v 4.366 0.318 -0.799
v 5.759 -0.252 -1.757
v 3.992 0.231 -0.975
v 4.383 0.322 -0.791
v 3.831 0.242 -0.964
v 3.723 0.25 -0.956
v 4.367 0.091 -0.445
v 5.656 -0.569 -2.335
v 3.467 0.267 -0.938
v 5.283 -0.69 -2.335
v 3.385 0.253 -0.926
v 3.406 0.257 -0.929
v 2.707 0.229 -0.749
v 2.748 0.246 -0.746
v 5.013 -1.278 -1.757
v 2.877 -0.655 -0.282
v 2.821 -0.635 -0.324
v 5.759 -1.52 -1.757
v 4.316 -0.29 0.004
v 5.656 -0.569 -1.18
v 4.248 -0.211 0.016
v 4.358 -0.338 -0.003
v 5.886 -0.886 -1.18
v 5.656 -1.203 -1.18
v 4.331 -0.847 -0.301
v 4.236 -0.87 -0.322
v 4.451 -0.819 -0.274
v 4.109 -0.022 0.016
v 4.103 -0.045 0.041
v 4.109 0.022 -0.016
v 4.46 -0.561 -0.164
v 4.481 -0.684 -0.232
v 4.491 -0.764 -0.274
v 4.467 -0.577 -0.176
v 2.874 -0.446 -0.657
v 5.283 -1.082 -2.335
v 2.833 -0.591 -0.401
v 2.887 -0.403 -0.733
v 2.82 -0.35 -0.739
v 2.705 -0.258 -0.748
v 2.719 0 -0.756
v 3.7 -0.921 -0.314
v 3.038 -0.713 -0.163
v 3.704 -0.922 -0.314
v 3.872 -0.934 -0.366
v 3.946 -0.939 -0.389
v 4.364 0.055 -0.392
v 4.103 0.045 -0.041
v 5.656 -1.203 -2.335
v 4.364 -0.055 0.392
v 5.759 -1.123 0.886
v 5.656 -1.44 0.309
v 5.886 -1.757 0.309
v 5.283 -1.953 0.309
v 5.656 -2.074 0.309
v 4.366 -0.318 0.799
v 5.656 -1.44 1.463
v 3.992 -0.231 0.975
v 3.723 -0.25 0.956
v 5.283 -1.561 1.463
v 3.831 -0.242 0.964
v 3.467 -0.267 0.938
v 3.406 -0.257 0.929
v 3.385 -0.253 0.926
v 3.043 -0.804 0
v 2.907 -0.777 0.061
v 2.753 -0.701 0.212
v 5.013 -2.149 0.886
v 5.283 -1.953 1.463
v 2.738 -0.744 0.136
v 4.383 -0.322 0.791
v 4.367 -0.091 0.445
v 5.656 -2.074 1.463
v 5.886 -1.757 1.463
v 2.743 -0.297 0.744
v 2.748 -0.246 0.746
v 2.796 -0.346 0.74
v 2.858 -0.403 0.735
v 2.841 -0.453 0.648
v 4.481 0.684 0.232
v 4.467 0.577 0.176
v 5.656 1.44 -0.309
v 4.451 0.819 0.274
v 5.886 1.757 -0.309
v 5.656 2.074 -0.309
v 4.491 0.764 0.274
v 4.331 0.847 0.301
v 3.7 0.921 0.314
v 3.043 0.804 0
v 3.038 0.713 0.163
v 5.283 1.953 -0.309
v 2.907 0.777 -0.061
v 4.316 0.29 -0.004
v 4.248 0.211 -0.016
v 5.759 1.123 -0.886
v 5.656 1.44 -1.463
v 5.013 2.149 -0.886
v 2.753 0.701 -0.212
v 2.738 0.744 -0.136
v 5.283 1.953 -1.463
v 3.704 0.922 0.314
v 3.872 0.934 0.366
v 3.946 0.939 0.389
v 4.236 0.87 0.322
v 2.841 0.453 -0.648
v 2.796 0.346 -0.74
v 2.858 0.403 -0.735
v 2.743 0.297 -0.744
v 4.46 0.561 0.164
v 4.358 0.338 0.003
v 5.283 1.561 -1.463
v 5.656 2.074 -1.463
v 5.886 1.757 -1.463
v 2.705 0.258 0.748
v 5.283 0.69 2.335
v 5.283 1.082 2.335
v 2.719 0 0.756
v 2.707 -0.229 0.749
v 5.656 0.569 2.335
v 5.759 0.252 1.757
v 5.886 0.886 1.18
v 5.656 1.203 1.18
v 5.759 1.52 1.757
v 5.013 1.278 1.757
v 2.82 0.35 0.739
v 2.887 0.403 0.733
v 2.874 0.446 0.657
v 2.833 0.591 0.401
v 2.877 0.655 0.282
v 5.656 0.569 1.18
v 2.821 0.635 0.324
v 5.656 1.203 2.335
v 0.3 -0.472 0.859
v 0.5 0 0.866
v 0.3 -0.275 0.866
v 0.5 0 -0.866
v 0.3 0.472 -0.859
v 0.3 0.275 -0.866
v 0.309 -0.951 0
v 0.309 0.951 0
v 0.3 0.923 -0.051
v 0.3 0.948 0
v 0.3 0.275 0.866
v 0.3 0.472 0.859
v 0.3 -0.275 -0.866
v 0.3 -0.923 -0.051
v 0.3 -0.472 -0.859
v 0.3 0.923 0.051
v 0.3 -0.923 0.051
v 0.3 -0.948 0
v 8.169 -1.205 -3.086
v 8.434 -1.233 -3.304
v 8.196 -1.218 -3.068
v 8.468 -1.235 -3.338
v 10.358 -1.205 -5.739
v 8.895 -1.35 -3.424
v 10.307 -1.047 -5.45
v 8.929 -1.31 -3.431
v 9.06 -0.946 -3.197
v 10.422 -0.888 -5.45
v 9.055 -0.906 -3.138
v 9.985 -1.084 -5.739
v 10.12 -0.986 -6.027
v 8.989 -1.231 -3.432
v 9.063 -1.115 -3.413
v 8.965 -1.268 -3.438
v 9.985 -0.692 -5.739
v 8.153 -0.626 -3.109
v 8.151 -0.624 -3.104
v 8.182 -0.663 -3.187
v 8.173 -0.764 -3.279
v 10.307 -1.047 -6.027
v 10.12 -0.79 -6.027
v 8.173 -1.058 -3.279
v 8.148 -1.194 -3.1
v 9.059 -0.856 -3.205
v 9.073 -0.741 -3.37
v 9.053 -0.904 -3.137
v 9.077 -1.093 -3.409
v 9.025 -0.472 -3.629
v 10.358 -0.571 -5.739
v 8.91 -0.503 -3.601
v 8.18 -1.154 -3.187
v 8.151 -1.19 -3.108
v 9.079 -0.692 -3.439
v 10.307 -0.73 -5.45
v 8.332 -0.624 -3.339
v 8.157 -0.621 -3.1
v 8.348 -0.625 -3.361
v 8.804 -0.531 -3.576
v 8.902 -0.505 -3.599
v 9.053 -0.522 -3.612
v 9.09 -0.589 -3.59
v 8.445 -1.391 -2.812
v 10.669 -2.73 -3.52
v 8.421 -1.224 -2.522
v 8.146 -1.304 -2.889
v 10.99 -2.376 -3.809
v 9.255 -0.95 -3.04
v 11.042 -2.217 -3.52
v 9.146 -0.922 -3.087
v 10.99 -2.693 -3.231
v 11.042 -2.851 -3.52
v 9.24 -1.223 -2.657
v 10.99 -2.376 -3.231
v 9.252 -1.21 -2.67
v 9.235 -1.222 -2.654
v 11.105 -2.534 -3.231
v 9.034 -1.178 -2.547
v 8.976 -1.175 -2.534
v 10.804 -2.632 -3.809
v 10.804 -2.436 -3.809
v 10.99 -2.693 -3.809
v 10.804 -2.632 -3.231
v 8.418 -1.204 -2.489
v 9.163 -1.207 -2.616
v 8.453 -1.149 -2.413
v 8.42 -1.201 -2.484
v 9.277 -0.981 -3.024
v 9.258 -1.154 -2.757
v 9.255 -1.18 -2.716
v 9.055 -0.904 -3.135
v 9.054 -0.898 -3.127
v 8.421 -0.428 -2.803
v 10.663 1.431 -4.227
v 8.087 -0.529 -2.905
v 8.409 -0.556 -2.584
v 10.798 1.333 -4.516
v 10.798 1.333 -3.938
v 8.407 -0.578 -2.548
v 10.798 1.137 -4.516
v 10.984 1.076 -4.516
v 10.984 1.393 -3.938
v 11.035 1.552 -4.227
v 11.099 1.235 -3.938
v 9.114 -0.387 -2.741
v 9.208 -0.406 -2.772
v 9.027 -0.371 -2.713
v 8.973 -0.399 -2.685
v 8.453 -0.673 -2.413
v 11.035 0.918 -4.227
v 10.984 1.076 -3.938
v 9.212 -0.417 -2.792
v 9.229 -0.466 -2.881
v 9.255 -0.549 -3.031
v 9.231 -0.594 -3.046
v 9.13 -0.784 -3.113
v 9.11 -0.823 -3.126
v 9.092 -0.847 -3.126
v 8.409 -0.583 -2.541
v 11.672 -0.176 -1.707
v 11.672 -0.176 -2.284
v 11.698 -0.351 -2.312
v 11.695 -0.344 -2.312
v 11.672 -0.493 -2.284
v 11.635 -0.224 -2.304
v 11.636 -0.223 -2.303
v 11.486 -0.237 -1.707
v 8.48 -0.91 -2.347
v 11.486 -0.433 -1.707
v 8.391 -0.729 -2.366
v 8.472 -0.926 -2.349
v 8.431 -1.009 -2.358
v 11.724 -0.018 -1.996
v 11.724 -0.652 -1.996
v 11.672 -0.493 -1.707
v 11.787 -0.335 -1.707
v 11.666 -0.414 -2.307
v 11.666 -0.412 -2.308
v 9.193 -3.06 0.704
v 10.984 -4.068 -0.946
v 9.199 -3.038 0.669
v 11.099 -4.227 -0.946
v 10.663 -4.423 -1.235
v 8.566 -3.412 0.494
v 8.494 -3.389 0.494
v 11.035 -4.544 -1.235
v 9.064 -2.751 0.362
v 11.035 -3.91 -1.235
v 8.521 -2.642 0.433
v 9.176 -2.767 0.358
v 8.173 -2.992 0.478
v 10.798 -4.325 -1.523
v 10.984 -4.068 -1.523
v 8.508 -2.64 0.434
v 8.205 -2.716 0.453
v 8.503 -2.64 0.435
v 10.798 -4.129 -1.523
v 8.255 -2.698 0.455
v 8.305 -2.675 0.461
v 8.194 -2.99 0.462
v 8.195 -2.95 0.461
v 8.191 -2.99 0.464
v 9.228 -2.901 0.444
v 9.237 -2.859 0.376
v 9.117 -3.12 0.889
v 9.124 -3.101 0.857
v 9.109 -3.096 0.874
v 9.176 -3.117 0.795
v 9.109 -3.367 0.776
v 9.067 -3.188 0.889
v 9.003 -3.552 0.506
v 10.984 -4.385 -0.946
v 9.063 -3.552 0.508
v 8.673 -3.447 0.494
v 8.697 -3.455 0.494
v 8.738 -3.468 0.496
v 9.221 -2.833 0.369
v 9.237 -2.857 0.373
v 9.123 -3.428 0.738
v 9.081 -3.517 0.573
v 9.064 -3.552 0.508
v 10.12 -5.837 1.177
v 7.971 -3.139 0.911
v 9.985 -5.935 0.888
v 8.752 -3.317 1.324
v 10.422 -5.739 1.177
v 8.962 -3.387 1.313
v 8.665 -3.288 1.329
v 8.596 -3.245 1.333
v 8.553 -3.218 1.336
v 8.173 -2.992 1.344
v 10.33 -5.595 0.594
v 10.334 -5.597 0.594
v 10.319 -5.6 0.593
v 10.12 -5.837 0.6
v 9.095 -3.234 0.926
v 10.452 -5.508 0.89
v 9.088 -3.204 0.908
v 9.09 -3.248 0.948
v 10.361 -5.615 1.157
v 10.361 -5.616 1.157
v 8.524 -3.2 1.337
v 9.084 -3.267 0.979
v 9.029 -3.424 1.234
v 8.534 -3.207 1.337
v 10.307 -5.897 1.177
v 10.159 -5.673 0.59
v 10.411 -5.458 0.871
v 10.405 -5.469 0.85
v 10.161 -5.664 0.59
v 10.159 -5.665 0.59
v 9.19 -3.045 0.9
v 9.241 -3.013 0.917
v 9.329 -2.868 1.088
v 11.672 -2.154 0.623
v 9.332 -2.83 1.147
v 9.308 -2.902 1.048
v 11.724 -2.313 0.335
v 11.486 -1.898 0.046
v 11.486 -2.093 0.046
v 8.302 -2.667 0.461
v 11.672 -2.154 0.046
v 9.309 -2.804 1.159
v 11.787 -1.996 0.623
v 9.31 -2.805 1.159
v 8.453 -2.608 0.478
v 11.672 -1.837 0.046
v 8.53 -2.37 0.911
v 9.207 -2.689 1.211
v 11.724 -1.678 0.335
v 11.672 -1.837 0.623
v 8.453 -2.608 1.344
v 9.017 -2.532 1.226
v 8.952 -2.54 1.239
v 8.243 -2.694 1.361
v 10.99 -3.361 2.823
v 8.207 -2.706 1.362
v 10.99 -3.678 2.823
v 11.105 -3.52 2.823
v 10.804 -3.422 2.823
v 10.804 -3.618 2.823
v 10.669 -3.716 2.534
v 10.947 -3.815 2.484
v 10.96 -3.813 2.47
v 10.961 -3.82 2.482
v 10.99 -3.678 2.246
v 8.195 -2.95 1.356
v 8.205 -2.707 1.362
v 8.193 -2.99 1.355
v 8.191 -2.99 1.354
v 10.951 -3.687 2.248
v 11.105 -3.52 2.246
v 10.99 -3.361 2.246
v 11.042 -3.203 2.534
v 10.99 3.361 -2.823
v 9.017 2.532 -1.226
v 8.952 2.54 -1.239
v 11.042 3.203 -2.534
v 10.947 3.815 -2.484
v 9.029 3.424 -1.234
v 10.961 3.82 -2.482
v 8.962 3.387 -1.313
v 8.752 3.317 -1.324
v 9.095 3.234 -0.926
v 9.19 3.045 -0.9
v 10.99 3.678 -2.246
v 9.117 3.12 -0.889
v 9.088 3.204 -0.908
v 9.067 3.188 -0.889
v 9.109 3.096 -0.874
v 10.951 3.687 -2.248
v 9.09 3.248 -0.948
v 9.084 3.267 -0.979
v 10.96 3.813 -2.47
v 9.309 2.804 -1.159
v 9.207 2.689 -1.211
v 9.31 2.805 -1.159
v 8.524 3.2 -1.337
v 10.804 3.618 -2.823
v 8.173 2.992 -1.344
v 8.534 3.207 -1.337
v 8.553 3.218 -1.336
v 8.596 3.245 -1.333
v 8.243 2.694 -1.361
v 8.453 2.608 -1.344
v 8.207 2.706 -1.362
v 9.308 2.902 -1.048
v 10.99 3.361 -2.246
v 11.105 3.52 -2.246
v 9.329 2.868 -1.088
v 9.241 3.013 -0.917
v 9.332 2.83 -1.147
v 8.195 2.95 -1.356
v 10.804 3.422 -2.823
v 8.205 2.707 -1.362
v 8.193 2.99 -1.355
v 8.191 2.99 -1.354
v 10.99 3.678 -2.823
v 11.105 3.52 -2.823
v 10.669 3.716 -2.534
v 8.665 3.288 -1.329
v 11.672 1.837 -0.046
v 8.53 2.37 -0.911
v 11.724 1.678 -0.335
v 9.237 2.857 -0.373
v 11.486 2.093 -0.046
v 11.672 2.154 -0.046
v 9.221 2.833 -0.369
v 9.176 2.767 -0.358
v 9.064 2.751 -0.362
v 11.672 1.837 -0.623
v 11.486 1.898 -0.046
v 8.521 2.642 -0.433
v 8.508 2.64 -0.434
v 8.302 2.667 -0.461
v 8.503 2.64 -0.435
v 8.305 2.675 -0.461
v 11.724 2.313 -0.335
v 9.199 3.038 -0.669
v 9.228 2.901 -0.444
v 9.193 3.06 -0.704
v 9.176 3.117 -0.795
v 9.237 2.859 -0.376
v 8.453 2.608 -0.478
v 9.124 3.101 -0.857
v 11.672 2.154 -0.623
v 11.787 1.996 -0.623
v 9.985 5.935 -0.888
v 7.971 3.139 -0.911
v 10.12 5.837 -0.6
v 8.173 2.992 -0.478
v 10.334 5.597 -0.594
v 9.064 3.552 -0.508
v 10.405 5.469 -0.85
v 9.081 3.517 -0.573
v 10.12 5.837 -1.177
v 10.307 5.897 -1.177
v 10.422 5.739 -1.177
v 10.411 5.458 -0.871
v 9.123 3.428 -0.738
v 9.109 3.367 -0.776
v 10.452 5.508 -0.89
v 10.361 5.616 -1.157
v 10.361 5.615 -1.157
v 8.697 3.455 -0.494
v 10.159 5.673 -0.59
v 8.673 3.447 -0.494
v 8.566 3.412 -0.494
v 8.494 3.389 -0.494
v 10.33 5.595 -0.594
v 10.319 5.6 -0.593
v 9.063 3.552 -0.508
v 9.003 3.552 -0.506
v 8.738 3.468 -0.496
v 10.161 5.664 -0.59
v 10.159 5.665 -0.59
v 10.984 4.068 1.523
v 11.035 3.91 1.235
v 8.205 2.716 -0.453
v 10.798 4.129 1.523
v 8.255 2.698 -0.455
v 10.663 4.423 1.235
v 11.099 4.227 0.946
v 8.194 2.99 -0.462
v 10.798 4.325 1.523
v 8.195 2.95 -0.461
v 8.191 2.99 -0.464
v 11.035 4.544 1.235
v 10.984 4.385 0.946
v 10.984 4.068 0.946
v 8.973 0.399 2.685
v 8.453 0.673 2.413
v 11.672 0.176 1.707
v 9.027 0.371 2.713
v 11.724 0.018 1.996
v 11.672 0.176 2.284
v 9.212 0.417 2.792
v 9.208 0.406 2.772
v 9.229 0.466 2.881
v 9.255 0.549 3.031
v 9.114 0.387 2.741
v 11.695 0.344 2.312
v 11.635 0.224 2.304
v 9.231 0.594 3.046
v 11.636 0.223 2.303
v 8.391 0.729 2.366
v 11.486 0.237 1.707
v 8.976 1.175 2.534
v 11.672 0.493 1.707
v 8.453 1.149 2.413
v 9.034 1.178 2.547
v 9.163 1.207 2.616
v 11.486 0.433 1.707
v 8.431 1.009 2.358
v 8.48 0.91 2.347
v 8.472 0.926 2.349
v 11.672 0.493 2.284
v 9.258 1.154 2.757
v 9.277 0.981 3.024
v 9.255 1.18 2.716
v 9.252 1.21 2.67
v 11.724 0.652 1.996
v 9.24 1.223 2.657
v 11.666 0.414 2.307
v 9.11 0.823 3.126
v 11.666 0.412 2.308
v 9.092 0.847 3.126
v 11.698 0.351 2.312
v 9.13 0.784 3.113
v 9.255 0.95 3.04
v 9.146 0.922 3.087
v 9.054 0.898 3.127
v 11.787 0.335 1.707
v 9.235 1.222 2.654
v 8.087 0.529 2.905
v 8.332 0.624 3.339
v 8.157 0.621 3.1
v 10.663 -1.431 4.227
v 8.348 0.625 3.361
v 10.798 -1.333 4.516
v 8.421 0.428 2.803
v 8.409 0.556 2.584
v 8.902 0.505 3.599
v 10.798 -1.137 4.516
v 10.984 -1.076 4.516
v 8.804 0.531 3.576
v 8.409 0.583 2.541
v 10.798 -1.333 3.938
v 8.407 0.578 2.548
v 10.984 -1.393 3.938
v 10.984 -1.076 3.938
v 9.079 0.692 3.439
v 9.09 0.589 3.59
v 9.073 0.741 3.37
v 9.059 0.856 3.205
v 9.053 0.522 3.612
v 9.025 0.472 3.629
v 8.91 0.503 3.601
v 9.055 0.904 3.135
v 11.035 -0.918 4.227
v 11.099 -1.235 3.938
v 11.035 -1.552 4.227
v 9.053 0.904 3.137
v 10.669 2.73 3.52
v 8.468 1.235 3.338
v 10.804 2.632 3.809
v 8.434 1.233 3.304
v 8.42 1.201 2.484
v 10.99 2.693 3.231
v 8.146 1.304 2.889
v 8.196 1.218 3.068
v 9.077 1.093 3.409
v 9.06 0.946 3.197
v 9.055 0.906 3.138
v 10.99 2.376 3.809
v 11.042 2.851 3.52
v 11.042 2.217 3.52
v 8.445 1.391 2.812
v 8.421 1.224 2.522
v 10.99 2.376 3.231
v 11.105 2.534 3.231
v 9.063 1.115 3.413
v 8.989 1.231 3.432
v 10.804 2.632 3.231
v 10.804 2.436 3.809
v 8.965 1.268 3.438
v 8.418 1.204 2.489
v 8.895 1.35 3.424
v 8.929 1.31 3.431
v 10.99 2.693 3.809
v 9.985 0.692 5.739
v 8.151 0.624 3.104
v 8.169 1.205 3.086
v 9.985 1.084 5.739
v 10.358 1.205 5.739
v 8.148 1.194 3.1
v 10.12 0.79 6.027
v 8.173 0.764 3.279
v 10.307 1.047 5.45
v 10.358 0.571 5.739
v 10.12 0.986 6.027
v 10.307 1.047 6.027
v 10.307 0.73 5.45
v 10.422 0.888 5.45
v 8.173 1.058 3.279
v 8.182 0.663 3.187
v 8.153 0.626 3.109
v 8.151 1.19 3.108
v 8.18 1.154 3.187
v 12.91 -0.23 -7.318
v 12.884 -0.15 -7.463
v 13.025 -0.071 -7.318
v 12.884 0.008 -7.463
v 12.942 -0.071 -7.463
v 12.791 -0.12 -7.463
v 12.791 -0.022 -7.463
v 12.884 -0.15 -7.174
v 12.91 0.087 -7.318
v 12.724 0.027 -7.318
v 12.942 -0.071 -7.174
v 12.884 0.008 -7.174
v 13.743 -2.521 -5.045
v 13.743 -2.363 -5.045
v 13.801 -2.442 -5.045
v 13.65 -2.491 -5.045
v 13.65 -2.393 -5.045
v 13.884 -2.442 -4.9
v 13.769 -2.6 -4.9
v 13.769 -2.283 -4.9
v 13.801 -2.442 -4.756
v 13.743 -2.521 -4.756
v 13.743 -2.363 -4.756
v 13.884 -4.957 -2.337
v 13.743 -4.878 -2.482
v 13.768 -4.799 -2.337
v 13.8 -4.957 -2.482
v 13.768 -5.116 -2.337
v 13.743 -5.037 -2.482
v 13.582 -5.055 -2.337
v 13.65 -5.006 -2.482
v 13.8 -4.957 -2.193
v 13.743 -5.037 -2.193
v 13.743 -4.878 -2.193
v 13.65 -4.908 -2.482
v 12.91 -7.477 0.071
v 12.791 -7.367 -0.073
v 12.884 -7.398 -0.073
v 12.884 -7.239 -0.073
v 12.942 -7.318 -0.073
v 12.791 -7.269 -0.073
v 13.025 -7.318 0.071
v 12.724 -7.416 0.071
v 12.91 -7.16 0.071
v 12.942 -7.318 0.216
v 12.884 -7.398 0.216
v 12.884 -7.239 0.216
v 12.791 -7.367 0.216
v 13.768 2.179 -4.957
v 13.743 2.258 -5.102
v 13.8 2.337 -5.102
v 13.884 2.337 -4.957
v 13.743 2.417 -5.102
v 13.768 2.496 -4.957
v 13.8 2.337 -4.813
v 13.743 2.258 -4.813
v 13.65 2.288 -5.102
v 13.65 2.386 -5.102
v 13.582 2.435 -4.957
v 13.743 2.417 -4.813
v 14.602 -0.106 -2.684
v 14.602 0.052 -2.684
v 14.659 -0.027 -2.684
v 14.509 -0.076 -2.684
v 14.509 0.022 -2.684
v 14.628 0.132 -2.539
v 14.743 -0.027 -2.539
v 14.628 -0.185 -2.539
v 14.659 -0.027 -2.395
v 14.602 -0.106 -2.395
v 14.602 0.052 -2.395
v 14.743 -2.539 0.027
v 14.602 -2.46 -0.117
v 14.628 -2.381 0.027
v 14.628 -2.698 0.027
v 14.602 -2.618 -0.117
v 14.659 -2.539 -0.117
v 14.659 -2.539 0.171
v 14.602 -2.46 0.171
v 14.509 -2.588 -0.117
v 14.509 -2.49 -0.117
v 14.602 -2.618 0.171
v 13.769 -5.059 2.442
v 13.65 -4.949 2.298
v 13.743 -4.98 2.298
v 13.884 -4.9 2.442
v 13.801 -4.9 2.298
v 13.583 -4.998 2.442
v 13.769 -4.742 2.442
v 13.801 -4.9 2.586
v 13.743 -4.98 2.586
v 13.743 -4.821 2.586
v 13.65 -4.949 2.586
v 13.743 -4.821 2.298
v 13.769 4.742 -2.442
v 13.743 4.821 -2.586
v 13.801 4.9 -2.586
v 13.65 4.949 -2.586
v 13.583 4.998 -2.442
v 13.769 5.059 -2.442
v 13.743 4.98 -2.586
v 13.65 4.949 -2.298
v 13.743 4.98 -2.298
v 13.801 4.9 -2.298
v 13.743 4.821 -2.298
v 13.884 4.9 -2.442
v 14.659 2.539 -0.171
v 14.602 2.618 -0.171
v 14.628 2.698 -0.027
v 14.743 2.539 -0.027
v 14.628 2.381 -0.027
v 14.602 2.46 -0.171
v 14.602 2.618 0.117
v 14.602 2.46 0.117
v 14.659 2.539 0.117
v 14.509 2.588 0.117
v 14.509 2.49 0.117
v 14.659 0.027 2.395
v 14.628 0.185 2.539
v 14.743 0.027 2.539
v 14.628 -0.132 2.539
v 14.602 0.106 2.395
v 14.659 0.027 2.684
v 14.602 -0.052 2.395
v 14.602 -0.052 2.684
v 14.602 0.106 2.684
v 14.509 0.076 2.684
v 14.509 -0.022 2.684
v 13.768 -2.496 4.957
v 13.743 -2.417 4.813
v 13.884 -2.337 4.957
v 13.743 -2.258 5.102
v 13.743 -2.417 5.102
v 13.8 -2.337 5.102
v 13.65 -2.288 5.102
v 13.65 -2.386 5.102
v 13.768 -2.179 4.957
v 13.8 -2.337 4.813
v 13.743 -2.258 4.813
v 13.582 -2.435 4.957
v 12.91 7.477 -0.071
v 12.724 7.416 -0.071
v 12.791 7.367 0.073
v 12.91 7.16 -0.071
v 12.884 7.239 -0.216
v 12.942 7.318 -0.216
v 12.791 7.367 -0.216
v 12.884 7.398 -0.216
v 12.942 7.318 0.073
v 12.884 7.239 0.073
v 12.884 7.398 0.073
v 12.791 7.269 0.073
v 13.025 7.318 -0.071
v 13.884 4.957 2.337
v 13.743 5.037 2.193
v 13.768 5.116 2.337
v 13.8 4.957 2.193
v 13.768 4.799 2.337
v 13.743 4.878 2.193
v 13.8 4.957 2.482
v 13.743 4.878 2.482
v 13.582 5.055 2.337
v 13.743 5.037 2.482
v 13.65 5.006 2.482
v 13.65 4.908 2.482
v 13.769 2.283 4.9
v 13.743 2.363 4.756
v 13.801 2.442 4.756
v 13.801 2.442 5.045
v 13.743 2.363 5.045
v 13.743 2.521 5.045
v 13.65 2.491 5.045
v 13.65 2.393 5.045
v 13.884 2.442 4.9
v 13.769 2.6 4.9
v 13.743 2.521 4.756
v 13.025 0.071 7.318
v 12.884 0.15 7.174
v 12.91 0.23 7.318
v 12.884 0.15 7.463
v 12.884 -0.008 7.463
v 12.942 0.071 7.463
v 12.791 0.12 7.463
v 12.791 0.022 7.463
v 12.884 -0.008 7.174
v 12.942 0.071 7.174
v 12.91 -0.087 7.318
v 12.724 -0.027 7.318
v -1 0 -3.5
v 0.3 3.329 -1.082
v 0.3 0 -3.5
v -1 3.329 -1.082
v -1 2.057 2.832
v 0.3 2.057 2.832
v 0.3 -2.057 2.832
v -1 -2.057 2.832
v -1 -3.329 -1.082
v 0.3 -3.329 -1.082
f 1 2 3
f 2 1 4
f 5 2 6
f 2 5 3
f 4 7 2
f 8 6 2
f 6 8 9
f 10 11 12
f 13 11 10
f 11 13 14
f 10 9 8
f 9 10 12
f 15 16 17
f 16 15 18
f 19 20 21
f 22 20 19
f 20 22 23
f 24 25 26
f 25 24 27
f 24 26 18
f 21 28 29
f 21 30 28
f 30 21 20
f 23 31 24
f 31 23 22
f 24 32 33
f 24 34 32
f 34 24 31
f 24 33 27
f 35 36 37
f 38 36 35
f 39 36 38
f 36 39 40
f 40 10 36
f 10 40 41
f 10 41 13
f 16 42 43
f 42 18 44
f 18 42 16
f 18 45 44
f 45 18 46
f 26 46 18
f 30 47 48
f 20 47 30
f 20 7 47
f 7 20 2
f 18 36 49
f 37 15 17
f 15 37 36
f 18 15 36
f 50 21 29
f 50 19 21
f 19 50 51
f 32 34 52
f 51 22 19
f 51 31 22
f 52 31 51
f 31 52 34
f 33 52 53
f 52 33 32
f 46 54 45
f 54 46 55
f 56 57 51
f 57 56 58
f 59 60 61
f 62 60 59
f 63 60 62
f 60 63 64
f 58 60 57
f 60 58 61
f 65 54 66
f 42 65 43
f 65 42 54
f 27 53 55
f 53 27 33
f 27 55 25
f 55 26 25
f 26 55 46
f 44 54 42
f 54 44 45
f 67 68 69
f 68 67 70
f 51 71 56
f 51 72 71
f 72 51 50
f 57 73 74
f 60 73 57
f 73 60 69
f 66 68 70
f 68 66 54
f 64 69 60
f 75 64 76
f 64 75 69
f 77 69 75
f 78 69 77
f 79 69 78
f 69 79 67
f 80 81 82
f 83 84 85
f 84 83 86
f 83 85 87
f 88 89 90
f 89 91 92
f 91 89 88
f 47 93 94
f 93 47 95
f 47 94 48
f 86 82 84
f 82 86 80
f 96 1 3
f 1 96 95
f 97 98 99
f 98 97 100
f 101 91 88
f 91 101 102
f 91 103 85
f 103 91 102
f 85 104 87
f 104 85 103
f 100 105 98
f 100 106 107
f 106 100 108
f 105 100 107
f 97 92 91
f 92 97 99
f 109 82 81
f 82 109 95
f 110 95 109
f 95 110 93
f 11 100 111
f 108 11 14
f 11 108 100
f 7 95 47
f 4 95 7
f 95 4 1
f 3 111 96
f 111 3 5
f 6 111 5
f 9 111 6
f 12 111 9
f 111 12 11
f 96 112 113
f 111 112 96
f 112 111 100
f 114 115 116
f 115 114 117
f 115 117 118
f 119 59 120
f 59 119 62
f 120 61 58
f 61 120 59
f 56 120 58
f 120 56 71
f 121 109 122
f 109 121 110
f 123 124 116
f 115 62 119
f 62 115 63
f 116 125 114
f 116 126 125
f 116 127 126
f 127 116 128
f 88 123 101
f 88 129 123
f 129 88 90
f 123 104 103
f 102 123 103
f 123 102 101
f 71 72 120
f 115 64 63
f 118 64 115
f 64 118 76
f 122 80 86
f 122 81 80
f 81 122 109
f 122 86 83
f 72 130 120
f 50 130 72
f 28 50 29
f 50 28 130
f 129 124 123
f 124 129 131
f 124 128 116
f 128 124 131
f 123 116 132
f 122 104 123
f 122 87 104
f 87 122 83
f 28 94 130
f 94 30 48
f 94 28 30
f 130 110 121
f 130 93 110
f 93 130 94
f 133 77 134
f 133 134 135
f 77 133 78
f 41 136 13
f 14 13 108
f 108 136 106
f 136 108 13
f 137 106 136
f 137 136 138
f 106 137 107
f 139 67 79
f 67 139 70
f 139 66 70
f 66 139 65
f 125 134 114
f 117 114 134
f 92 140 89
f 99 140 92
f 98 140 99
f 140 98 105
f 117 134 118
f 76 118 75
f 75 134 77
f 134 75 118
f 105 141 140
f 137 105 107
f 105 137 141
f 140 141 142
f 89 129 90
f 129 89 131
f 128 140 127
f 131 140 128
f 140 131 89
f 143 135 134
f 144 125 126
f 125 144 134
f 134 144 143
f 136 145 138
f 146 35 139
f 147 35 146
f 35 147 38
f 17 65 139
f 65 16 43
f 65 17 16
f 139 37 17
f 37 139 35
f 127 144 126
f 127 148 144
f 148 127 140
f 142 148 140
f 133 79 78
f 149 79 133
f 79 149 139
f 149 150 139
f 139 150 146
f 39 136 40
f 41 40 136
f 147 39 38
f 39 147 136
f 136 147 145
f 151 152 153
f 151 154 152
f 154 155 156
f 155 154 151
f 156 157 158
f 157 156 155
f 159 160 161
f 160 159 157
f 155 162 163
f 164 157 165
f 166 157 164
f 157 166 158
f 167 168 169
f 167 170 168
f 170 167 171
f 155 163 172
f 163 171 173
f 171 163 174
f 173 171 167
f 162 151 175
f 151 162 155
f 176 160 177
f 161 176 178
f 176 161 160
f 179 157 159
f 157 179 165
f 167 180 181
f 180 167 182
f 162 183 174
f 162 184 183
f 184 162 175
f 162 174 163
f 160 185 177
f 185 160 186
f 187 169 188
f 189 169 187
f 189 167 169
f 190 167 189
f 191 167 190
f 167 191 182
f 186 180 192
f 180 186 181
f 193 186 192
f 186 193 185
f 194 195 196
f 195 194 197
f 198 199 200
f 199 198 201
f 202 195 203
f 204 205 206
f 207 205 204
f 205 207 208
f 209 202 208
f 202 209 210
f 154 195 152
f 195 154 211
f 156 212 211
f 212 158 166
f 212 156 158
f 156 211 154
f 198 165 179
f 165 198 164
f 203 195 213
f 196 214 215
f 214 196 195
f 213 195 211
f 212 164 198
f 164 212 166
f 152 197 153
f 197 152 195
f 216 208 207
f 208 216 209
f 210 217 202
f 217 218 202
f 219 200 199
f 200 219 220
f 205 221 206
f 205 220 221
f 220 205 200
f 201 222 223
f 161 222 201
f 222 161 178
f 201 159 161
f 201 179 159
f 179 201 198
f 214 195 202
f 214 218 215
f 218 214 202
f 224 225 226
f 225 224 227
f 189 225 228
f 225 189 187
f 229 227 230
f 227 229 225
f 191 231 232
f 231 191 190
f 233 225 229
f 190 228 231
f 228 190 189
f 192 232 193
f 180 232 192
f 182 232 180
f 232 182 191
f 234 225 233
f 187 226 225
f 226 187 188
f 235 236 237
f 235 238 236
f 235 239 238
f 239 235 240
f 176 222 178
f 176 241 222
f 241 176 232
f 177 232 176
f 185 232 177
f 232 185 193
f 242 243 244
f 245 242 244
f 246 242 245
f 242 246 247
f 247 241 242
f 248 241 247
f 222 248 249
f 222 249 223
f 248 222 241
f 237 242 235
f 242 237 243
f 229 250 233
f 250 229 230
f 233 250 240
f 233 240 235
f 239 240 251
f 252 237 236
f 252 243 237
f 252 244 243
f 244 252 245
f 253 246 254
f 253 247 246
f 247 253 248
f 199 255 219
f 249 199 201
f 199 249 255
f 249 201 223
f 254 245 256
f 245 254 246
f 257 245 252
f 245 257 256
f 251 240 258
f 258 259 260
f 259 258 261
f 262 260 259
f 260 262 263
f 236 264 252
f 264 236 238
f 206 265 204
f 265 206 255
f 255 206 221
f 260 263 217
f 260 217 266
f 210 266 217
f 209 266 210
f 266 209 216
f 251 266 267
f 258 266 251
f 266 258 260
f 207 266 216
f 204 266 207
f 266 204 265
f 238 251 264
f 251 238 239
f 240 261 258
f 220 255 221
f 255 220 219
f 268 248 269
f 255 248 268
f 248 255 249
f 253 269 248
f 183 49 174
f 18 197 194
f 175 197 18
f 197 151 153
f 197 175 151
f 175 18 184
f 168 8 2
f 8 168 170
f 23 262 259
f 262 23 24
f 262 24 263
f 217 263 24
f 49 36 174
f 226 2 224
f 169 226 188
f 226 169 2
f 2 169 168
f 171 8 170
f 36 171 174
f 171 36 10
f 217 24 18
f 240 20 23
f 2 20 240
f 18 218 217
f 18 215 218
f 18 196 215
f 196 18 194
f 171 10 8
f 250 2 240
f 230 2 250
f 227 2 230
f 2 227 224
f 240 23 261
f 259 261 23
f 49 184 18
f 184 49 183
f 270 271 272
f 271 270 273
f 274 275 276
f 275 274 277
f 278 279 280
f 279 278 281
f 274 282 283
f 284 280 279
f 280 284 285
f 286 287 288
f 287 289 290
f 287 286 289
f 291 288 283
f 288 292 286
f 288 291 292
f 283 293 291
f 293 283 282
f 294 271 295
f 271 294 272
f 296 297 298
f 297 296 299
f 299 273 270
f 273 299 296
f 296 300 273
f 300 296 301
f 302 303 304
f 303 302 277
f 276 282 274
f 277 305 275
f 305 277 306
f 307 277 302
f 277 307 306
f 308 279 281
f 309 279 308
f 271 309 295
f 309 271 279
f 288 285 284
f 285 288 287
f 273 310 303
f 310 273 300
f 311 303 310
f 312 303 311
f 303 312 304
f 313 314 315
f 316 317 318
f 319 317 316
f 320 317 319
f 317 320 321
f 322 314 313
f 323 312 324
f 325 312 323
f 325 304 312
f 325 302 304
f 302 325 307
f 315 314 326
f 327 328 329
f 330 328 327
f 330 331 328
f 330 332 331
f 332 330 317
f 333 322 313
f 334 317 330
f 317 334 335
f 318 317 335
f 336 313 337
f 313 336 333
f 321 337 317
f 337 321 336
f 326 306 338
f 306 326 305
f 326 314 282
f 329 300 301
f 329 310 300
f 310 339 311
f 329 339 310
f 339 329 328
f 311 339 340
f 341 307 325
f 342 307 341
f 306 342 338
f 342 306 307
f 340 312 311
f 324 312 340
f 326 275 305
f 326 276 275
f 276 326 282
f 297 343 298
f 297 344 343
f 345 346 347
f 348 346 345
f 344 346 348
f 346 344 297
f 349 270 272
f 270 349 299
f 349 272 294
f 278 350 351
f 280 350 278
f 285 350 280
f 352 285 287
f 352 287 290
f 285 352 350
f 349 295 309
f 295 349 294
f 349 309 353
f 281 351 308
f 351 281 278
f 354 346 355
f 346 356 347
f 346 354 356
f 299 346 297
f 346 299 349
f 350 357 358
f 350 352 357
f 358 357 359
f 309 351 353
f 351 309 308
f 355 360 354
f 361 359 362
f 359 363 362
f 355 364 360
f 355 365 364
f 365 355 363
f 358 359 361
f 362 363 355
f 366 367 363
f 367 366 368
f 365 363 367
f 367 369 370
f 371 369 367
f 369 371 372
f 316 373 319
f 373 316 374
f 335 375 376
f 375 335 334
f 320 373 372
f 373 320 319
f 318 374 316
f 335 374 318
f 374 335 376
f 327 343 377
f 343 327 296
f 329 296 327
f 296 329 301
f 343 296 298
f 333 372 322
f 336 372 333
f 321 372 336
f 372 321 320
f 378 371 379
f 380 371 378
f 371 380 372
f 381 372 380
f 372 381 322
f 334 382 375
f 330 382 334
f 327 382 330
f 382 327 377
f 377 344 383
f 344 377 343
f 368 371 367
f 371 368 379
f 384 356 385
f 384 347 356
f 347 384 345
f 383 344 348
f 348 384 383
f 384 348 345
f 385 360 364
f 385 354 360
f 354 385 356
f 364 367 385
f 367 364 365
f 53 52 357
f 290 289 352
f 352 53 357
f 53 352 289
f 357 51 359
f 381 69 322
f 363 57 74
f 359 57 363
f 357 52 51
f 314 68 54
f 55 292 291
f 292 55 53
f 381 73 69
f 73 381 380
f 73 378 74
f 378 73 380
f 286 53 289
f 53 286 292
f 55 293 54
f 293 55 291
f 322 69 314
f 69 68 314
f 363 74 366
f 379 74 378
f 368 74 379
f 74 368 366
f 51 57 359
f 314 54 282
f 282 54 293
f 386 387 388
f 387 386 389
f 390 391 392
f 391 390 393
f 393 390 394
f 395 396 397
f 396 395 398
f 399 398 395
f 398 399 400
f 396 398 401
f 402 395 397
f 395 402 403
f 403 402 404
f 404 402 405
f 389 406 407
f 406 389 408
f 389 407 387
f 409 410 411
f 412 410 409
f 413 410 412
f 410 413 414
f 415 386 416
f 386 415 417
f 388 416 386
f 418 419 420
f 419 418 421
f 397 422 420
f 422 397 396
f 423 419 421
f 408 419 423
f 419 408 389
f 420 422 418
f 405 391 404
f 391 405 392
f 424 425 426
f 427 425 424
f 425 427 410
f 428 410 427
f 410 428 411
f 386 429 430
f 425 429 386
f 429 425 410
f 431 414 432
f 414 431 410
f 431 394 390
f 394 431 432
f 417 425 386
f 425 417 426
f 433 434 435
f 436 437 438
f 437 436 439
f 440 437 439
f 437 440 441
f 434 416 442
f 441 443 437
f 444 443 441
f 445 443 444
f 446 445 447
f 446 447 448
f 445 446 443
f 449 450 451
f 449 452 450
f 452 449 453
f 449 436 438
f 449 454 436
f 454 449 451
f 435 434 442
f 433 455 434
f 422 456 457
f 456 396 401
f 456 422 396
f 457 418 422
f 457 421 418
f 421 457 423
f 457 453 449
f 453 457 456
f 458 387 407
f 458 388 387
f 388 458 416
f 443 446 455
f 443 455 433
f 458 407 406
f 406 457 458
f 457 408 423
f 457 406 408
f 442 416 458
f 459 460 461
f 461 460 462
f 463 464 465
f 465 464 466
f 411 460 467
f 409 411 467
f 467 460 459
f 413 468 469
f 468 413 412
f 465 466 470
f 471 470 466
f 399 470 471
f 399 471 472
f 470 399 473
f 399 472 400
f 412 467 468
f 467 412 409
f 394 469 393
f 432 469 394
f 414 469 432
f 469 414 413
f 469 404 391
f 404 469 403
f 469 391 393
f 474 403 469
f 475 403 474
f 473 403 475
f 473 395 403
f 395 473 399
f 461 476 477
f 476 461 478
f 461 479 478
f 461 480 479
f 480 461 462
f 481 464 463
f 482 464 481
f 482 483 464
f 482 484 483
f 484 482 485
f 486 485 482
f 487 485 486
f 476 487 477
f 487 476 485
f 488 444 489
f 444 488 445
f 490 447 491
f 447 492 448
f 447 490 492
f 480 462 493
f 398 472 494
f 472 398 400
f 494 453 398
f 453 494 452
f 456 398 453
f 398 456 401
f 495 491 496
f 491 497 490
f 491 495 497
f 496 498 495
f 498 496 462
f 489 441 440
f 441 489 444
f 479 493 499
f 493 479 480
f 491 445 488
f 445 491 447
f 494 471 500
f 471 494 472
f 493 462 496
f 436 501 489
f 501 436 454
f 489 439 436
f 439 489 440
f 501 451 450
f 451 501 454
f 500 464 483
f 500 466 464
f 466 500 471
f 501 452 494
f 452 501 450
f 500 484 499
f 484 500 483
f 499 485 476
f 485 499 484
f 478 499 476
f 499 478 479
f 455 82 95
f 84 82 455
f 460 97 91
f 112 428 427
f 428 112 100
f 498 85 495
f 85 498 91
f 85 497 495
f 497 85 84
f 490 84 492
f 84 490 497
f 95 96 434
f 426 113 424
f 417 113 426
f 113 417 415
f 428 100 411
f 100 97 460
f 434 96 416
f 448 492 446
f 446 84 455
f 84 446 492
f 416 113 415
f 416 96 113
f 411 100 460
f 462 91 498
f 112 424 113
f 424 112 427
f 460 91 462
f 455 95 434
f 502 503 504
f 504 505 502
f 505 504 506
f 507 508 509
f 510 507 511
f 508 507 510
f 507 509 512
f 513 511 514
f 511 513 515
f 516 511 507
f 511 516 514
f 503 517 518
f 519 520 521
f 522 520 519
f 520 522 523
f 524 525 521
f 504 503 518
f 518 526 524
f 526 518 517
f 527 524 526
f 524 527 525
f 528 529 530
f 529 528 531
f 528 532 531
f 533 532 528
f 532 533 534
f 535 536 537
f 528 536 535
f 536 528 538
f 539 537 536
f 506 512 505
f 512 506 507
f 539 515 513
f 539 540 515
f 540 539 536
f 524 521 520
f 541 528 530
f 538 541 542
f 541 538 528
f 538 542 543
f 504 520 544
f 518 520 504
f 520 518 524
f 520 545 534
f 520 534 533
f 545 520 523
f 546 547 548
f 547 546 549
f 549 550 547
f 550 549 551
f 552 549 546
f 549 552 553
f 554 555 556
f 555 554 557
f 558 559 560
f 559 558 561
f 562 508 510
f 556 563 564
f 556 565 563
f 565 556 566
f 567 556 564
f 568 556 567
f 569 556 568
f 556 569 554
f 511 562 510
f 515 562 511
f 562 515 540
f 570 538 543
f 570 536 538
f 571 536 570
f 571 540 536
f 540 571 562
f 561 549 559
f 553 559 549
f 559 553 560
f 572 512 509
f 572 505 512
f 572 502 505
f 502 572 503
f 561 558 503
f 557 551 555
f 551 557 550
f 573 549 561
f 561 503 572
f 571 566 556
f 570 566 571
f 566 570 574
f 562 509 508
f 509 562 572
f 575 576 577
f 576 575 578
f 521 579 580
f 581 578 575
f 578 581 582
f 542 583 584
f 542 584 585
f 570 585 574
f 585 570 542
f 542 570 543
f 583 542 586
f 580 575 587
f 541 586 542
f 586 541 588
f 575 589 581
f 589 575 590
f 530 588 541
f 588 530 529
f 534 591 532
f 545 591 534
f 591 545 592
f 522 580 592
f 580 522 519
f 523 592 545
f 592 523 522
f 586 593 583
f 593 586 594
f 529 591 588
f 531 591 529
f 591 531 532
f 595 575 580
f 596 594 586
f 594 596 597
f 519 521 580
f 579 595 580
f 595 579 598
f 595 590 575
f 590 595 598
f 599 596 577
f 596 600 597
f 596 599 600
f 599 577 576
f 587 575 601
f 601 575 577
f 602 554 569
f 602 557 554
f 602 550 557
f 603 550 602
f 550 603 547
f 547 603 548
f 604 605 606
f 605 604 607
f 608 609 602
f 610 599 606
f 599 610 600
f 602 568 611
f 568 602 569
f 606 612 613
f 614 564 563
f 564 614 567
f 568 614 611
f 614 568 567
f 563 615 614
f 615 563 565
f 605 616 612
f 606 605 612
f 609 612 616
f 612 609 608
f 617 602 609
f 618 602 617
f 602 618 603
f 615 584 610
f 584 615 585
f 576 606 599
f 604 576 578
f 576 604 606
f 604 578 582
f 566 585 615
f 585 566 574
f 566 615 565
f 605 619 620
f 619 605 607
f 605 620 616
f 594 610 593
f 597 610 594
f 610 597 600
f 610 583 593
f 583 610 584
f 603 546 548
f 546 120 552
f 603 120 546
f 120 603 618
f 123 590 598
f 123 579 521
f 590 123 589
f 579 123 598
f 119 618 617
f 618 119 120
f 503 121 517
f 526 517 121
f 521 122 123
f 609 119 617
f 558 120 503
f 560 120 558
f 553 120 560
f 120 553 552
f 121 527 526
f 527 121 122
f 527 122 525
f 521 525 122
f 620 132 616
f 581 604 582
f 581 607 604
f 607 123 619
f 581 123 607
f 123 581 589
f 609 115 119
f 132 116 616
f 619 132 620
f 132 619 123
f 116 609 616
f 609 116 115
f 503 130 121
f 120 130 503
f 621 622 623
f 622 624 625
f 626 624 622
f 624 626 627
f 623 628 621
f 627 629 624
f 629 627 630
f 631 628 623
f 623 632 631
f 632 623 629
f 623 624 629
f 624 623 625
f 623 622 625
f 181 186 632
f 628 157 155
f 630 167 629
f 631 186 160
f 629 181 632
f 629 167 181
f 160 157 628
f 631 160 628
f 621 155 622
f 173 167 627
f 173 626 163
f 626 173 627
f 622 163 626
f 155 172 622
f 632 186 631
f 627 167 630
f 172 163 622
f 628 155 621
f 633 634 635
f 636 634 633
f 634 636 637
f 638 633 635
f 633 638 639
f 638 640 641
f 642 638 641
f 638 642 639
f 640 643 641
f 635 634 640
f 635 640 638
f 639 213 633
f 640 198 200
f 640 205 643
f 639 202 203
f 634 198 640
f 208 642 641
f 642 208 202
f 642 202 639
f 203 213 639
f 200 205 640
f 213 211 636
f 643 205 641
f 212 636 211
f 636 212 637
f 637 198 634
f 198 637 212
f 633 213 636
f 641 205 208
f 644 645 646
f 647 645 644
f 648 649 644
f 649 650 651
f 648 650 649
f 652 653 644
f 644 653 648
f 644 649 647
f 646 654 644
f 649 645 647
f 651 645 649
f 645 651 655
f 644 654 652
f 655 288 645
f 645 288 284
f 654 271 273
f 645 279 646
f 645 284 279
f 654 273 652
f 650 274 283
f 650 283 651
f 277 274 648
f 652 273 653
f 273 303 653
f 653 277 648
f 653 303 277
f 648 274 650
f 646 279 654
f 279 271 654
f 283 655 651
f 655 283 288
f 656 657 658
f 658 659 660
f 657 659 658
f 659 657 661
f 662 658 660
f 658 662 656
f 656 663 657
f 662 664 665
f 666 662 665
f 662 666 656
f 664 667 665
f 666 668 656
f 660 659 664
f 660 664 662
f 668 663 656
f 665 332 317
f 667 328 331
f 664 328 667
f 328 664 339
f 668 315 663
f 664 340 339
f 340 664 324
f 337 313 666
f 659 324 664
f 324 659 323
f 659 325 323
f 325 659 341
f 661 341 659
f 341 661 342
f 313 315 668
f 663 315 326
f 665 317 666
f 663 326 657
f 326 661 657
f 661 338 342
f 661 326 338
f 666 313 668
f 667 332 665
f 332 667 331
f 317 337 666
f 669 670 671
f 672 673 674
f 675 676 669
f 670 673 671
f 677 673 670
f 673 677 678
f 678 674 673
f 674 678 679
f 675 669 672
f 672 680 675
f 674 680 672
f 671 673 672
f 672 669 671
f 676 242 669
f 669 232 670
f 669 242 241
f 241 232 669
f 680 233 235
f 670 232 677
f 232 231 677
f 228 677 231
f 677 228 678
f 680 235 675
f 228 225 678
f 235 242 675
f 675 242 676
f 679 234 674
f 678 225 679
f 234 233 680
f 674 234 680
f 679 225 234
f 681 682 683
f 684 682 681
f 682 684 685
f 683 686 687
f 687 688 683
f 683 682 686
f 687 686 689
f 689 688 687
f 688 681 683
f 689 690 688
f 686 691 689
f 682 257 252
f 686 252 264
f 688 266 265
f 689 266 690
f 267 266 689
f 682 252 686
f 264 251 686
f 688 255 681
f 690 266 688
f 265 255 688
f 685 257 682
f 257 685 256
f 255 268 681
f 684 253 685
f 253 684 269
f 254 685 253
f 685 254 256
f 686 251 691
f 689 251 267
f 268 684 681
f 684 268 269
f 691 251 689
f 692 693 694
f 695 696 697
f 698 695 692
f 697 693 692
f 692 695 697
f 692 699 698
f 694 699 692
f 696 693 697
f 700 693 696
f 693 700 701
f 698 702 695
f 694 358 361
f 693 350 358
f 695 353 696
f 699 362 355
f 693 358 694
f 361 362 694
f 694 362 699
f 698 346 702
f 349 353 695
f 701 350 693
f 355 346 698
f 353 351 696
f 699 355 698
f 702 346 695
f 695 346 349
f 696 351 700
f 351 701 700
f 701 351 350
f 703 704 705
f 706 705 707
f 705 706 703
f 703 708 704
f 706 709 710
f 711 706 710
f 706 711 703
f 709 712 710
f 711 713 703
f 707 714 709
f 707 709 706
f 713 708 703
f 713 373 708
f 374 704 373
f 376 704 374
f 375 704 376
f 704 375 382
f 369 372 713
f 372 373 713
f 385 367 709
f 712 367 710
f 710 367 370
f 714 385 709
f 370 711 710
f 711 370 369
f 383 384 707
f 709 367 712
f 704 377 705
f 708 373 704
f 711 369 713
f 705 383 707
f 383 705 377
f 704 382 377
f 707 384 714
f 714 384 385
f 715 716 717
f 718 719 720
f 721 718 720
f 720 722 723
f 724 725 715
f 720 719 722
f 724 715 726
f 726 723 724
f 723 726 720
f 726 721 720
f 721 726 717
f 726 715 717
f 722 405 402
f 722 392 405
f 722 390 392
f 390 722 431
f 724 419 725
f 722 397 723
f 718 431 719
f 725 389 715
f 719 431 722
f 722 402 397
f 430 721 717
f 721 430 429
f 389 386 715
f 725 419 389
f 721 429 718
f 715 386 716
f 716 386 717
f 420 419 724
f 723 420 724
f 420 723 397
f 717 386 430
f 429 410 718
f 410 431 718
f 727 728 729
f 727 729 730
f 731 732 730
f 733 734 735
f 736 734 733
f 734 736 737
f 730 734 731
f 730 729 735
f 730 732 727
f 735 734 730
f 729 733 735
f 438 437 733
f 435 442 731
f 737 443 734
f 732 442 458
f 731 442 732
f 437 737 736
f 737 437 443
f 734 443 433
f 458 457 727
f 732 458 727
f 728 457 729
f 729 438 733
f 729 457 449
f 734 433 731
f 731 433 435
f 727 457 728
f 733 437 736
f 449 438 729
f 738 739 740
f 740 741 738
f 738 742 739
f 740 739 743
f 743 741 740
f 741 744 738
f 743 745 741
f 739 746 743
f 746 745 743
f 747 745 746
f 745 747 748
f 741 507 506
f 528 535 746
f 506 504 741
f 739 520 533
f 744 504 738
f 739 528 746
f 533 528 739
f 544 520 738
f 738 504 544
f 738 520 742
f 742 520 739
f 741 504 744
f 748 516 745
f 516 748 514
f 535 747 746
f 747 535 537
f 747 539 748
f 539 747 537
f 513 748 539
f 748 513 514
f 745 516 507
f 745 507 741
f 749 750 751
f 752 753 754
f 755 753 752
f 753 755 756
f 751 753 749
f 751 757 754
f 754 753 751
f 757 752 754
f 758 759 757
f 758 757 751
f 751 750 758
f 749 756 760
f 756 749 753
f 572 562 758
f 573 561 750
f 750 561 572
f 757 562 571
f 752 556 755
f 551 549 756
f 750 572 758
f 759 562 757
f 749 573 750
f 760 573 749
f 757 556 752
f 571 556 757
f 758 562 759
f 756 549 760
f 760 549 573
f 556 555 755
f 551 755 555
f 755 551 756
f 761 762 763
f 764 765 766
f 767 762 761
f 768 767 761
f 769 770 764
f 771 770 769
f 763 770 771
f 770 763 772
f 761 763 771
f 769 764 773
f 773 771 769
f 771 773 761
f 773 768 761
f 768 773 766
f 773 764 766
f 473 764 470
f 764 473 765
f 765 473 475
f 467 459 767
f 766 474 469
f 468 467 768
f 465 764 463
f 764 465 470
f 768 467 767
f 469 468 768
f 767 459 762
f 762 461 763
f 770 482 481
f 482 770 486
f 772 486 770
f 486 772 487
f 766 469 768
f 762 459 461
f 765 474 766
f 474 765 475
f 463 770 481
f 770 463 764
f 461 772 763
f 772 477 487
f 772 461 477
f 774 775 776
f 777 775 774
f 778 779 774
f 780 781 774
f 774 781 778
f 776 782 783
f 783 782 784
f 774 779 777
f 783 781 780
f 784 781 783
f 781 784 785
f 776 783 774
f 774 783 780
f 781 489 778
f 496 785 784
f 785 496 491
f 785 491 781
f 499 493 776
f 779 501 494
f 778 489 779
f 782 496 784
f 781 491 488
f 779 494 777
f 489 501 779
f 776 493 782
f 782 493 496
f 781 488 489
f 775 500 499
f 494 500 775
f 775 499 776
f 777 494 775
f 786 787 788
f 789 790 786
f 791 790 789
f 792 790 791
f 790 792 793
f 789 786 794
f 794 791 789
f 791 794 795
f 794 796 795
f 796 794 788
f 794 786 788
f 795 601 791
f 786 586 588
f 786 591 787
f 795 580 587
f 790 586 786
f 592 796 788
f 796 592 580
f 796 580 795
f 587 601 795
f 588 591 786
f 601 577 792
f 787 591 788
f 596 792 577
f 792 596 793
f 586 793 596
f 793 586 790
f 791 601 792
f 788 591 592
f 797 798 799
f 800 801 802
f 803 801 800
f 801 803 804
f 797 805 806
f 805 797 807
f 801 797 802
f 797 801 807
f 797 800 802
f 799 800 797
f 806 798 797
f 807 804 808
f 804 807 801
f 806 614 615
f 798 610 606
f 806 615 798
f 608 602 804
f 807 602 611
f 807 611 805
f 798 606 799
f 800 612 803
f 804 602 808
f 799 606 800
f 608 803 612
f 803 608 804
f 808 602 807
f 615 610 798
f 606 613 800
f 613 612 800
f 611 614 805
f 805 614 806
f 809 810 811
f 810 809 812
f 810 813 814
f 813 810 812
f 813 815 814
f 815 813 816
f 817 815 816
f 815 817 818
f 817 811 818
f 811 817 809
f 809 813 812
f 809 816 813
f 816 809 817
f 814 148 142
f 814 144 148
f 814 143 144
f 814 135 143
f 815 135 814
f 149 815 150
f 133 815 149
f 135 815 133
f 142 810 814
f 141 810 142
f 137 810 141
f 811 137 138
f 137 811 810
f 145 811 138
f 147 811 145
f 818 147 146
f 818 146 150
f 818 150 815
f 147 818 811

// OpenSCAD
$fn = 5;

alpha = 75;
l = 3;
up = 1;

X = 3;
Y = 3;
Z = 3;

angly = 4.5;

translate([-1, 0, 0])
rotate(90, [0, 1, 0])
cylinder(1.3, 3.5, 3.5);

function remap(x0) = let(
    alpha=x0[2] * 3,
    x = cos(alpha) * x0[0] - sin(alpha) * x0[1], 
    y = cos(alpha) * x0[1] + sin(alpha) * x0[0]
)[
    x0[2] * cos(x * angly) * cos(y * angly),
    x0[2] * sin(x * angly) * cos(y * angly),
    x0[2] * cos(x * angly) * sin(y * angly),
];

module sphere_hull(x0, x1, r0, r1){
    sp0 = remap(x0);
    sp1 = remap(x1);
    hull(){
        translate(sp0) sphere(r0);
        translate(sp1) sphere(r1);
    }
}

old_one = false;

if (old_one){
for (j = [0: Z-1]){
    for (i = [round(-j/2): max(round((j - 1)/2), 0)]){
        for (k = [round(-j/2): max(round((j - 1)/2), 0)]){
            let(s = 1)
            let(next_s = 1)
            translate([l*cos(alpha) * (j%2) * s, l*cos(alpha) * (j%2) * s, 0]){
                translate([i * 2 * cos(alpha) * l * s, k * 2 * cos(alpha) * l * s, l * j * (1 + sin(alpha))])
                sphere_hull([0, 0, 0],[0, 0, l], 1, 1);

                translate([i * 2 * cos(alpha) * l * s, k * 2 * cos(alpha) * l * s, l * j * (1 + sin(alpha))])
                for (sgx = [-1, 1]) for (sgy = [-1, 1])
                sphere_hull(
                    [0, 0, l],
                    [sgx * cos(alpha) * l * next_s, sgy * cos(alpha) * l * next_s, l * (1 + sin(alpha))]
                    , 1, 1
                );
            }
        }
    }
}
}
else{
for (j = [0: Z-1]){
    for (i = [0: pow(2, j) - 1]){
        for (k = [0: pow(2, j) - 1]){
            let(s = pow(2, Z - j))
            let(next_s = pow(2, Z - j - 1))
            let(offs = - l * cos(alpha) * (pow(2, j) - 1) * s)
            let(branch = 2 * cos(alpha) * l * s)
            let(upstep = l * (up + sin(alpha))){
            sphere_hull(
                [offs + i * branch, offs + k * branch, j * upstep],
                [offs + i * branch, offs + k * branch, l * up + j * upstep],
                r0 = 1 - (j/Z),
                r1 = 1 - (j+0.5)/Z
            );
            for (sgx = [-1, 1]) for (sgy = [-1, 1])
                sphere_hull(
                    [offs + i * branch, offs + k * branch, l * up + j * upstep],
                    [offs + i * branch + sgx * cos(alpha) * l * next_s, offs + k * branch + sgy * cos(alpha) * l * next_s, upstep + j * upstep],
                    r0 = 1 - (j + 0.5)/Z,
                    r1 = 1 - (j + 1)/Z
                );
            }
        }
    }
}
}
